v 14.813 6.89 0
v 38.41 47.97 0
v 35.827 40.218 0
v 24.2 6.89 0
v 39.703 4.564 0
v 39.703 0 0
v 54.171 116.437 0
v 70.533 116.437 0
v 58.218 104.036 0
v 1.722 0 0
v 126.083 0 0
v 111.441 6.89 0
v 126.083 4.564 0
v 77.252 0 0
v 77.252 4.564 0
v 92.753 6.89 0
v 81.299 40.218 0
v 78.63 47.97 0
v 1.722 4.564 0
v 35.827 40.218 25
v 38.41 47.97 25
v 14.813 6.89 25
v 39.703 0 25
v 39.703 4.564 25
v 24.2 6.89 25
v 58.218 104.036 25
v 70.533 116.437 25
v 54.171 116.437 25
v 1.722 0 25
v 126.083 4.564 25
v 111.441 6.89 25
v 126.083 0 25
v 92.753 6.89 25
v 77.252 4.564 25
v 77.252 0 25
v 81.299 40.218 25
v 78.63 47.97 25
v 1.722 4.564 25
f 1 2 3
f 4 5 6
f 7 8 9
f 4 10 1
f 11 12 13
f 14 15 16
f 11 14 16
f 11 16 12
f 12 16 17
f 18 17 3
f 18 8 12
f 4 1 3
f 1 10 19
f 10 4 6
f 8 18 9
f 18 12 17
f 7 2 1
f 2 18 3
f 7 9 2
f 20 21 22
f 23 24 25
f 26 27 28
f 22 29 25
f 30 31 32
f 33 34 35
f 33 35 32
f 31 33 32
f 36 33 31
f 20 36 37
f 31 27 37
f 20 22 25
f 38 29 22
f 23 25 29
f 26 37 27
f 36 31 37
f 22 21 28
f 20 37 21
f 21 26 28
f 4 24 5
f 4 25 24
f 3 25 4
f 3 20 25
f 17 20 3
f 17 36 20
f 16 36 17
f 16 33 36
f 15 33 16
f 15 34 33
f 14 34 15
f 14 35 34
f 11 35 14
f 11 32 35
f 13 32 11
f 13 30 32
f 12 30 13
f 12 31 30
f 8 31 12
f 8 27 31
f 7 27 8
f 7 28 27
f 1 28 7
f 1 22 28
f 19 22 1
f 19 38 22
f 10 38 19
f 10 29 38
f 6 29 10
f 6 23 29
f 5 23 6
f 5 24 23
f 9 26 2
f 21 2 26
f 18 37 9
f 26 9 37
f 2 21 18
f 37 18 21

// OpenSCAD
block_xy_size=127;
block_z=25;

linear_extrude(height = block_z)
text("A", font = "Times New Roman", size=block_xy_size);
